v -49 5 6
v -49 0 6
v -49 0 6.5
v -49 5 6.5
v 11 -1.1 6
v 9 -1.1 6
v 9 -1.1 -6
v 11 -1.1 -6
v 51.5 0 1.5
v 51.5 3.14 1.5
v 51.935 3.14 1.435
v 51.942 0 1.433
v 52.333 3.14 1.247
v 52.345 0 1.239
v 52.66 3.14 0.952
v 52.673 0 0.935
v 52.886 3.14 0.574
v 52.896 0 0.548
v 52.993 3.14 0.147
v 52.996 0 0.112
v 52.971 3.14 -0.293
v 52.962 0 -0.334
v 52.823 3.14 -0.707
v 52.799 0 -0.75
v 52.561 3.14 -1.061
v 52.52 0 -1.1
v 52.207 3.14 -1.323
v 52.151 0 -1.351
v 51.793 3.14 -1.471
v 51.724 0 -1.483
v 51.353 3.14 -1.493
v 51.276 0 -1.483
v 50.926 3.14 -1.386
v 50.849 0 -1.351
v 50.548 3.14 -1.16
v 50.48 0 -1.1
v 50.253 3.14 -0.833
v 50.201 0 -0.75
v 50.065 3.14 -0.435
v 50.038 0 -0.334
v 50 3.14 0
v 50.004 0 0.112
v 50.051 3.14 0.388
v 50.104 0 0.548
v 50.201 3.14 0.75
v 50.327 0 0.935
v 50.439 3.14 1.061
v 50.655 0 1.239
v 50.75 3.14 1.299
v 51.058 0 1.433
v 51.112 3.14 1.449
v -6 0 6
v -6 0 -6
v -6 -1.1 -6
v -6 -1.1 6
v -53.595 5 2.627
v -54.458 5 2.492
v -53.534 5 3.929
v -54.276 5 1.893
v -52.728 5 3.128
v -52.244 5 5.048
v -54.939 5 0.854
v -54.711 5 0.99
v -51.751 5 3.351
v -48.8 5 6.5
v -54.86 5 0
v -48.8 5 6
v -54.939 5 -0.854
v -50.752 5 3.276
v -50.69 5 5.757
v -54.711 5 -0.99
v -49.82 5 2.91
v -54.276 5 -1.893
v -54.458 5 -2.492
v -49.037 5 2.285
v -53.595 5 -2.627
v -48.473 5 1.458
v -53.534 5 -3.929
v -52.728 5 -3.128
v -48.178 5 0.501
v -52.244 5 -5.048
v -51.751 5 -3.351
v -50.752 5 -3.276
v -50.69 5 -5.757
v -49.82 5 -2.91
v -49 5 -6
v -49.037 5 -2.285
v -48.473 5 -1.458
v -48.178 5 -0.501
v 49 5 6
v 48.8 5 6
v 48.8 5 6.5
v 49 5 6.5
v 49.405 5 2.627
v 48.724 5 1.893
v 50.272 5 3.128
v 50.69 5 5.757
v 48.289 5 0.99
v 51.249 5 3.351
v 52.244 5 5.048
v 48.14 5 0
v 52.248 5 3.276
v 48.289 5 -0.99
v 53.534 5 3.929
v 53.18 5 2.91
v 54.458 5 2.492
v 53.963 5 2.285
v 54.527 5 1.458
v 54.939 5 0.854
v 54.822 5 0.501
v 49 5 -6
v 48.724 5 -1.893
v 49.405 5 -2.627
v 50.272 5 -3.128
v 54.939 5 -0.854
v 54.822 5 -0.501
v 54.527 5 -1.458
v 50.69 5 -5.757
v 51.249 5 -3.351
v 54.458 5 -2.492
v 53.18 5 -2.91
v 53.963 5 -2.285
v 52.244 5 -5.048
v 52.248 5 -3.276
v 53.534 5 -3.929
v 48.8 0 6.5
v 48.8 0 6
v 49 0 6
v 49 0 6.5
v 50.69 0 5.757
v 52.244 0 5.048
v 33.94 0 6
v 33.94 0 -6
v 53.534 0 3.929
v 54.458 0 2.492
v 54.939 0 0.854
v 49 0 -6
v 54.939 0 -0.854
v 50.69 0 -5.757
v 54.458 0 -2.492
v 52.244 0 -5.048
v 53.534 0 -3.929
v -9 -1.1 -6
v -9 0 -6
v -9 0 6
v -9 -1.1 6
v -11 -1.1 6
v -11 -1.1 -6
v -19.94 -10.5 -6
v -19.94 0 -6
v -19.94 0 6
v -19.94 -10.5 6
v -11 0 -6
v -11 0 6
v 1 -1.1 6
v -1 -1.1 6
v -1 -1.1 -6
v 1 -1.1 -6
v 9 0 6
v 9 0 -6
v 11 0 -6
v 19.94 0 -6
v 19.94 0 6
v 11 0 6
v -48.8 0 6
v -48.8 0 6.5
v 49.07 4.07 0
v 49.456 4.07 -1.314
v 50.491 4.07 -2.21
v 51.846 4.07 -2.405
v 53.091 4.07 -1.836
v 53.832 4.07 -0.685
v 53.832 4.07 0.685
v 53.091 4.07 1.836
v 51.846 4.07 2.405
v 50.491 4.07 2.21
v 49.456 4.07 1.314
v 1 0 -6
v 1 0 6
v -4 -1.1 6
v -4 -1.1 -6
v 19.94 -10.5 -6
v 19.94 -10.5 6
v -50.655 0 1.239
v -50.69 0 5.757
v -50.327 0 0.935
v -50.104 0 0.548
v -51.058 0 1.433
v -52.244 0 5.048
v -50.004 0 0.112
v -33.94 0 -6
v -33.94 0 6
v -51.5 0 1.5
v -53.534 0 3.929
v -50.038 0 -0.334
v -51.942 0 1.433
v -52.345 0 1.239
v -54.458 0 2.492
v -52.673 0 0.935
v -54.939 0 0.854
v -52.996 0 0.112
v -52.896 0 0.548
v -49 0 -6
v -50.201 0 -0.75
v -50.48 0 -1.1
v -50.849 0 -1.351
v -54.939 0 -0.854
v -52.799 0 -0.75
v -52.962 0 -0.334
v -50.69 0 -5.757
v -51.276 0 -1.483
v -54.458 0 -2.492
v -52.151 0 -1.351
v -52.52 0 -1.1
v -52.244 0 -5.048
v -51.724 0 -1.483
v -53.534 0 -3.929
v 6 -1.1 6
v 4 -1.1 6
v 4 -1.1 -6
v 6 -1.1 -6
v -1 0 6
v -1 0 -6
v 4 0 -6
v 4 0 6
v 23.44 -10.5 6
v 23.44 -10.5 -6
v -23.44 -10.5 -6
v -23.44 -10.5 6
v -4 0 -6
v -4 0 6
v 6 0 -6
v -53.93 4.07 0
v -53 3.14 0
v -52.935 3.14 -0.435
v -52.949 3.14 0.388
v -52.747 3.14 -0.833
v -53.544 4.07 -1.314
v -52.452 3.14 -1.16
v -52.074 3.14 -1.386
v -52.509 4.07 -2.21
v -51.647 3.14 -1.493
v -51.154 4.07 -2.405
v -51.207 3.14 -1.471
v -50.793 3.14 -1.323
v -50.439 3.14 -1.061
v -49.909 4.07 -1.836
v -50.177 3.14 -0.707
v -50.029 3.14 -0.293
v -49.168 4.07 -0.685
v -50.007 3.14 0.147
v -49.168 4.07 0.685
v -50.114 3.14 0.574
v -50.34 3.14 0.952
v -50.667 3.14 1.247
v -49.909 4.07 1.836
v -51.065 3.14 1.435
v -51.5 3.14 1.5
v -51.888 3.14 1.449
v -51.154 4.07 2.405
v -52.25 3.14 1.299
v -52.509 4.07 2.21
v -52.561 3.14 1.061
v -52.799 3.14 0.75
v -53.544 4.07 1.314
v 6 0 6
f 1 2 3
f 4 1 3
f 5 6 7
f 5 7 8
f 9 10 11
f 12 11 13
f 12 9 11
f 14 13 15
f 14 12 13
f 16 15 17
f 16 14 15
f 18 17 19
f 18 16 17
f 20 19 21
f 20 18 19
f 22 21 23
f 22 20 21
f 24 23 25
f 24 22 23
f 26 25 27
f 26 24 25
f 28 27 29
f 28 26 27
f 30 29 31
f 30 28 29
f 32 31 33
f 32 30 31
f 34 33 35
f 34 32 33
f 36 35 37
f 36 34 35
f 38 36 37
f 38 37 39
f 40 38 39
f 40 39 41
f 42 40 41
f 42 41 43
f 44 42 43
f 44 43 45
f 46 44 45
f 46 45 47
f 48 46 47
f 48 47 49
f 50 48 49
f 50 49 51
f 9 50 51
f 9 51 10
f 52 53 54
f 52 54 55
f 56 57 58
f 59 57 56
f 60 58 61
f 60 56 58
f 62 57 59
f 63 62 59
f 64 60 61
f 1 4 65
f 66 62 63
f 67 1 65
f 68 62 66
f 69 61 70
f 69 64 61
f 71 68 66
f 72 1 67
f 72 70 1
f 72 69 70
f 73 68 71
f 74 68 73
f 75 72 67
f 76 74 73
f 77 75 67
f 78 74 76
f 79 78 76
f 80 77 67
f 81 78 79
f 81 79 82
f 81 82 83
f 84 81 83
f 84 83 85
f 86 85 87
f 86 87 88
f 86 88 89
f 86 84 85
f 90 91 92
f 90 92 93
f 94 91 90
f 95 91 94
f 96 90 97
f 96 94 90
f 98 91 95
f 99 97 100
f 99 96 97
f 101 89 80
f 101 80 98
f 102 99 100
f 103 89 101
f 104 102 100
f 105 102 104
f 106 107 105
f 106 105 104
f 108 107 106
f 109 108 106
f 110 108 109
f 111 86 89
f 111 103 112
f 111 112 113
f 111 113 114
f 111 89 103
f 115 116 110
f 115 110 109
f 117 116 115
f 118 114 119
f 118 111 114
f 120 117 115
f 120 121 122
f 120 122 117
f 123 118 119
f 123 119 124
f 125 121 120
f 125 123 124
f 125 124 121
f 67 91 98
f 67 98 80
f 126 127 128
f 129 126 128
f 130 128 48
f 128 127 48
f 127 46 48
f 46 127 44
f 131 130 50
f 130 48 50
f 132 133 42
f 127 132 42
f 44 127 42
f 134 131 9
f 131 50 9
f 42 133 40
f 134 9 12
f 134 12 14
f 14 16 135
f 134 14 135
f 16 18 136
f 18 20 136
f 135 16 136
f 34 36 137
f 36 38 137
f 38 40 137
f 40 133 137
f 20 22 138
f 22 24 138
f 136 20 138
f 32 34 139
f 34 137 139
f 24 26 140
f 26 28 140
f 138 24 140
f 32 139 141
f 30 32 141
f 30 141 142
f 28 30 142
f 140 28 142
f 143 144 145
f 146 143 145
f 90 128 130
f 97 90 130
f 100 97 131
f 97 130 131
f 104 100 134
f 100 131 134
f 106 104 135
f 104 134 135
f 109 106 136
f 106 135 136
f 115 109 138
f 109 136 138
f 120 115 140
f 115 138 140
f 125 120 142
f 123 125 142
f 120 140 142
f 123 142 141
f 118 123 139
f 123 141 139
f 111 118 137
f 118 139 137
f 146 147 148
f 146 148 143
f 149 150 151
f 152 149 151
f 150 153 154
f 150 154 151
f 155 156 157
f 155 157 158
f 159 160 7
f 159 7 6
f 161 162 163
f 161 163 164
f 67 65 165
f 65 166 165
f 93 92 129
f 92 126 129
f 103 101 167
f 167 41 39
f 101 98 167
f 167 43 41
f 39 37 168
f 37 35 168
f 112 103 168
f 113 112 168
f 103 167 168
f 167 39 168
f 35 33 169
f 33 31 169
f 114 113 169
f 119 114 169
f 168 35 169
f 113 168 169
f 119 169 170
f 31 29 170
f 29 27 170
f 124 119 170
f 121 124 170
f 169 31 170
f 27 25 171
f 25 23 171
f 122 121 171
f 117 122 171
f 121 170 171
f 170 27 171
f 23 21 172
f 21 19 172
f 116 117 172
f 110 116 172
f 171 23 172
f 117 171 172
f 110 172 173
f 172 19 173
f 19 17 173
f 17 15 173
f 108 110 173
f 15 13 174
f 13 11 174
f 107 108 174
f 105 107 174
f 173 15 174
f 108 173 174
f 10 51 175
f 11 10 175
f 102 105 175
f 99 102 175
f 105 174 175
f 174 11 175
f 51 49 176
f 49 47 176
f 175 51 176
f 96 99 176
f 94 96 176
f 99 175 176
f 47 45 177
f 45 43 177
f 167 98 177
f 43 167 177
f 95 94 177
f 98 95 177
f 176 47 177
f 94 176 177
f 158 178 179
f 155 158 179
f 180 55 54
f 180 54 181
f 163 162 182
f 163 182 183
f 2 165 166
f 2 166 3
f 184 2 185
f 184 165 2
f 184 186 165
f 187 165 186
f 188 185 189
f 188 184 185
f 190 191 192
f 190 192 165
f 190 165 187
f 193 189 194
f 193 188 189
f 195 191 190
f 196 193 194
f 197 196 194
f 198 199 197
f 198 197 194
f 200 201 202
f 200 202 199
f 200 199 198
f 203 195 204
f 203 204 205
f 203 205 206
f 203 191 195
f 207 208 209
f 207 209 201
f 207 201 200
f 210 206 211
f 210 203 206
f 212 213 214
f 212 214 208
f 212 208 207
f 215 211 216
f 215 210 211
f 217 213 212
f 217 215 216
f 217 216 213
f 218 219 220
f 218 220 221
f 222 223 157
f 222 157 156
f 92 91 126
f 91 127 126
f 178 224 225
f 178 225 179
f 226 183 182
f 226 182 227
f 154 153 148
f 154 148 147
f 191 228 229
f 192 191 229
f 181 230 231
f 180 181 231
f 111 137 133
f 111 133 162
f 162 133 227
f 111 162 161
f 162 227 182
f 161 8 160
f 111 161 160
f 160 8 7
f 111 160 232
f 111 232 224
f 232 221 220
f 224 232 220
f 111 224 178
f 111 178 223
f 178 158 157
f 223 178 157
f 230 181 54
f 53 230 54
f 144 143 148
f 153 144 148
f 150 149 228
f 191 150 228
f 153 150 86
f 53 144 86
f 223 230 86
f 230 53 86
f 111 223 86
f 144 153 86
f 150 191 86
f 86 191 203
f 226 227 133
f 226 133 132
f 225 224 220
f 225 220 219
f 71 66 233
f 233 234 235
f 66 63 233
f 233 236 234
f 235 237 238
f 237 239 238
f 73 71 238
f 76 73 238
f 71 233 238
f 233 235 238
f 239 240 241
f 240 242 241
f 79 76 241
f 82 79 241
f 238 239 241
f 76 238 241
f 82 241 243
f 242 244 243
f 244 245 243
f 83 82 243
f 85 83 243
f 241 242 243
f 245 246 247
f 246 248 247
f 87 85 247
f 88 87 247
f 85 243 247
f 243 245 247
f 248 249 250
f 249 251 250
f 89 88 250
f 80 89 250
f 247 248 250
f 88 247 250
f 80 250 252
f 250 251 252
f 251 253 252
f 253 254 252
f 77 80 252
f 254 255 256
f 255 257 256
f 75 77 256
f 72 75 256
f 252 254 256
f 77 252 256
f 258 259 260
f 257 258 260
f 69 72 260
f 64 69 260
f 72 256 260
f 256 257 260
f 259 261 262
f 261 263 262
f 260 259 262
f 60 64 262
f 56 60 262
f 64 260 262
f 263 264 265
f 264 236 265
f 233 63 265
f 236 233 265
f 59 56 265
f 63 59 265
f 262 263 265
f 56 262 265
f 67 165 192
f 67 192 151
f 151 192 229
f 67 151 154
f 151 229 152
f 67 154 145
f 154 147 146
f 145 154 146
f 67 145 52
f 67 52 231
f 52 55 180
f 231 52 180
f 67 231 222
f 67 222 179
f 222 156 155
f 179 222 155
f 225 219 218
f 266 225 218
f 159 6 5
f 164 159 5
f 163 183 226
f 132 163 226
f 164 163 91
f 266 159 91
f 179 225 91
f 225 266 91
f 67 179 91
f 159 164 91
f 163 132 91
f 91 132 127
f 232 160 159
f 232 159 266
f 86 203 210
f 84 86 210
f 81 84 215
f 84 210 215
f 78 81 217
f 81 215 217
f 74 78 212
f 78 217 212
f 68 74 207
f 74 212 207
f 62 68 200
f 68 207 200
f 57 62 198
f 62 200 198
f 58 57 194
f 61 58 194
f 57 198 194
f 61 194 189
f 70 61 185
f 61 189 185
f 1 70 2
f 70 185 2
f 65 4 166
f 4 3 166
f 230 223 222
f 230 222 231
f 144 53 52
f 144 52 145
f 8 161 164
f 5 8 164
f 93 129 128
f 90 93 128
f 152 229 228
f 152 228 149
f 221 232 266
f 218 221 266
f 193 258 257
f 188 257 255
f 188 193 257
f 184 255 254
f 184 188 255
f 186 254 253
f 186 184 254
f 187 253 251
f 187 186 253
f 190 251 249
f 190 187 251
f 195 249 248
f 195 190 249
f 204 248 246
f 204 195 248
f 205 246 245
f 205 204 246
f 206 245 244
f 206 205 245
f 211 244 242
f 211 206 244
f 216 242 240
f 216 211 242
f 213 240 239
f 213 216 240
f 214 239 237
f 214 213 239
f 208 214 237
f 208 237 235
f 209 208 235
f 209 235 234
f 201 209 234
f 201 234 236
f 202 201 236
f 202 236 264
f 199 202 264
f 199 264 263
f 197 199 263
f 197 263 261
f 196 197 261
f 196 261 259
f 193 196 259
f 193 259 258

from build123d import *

# Parameters (mm, degrees)
SKETCH1_R                     = 1.5
BOSS_EXTRUDE1_DEPTH           = 3
SKETCH4_W                     = 3.5
SKETCH4_H                     = 12
BOSS_EXTRUDE3_DEPTH           = 10.5
SKETCH5_W                     = 2
SKETCH5_H                     = 12
BOSS_EXTRUDE4_DEPTH           = 1.1
SKETCH6_W                     = 0.2
SKETCH6_H                     = 3
BOSS_EXTRUDE5_DEPTH           = 0.5
CHAMFER1_SIZE                 = 10.5
F_3_0MM_DOWEL_HOLE1_D         = 3
F_3_0MM_DOWEL_HOLE1_DEPTH     = 13.5
SKETCH10_R                    = 1.5
BOSS_EXTRUDE6_DEPTH           = 2
CSK_FOR_M3_SFHCS1_D           = 3
CSK_FOR_M3_SFHCS1_DEPTH       = 31.098709071
CSK_FOR_M3_SFHCS1_CSINK_D     = 6.72
CSK_FOR_M3_SFHCS1_CSINK_ANGLE = 90
CSK_FOR_M3_SFHCS1_TIP         = 0.901290929


with BuildPart() as part:
    # Sketch1 → Boss-Extrude1 (new body)
    with BuildSketch(Plane(origin=(0, 0, 0), x_dir=(1, 0, 0), z_dir=(0, 1, 0))):
        with BuildLine():
            Line((-49, 6), (49, 6))
            ThreePointArc((49, 6), (55, 0), (49, -6))
            Line((49, -6), (-49, -6))
            ThreePointArc((-49, -6), (-55, 0), (-49, 6))
        make_face()
        with Locations(Location((-51.5, 0, 0), (0, 0, 270))):
            Circle(SKETCH1_R, mode=Mode.SUBTRACT)
        with Locations(Location((51.5, 0, 0), (0, 0, 270))):
            Circle(SKETCH1_R, mode=Mode.SUBTRACT)
    extrude(amount=BOSS_EXTRUDE1_DEPTH)

    # Sketch4 → Boss-Extrude3 (add)
    with BuildSketch(Plane.XZ):
        with Locations((-21.690023983, 0)):
            Rectangle(SKETCH4_W, SKETCH4_H)
        with Locations((21.690023983, 0)):
            Rectangle(SKETCH4_W, SKETCH4_H)
    extrude(amount=BOSS_EXTRUDE3_DEPTH)

    # Sketch5 → Boss-Extrude4 (add)
    with BuildSketch(Plane.XZ):
        with Locations((5, 0)):
            Rectangle(SKETCH5_W, SKETCH5_H)
        Rectangle(SKETCH5_W, SKETCH5_H)
        with Locations((10, 0)):
            Rectangle(SKETCH5_W, SKETCH5_H)
        with Locations((-5, 0)):
            Rectangle(SKETCH5_W, SKETCH5_H)
        with Locations((-10, 0)):
            Rectangle(SKETCH5_W, SKETCH5_H)
    extrude(amount=BOSS_EXTRUDE4_DEPTH)

    # Sketch6 → Boss-Extrude5 (add)
    with BuildSketch(Plane.XY.offset(6)):
        with Locations((48.9, 1.5)):
            Rectangle(SKETCH6_W, SKETCH6_H)
        with Locations((-48.9, 1.5)):
            Rectangle(SKETCH6_W, SKETCH6_H)
    extrude(amount=BOSS_EXTRUDE5_DEPTH)

    # Chamfer1
    chamfer1_edges = [part.edges().sort_by_distance(p)[0] for p in [
        (23.440023983, 0, 0),
        (-23.440023983, 0, 0),
    ]]
    chamfer(chamfer1_edges, length=CHAMFER1_SIZE - 0.0001)  # a hair under: the kernel refuses the full size

    # Ø3.0mm Dowel Hole1
    with Locations(Plane(origin=(0, 3, 0), x_dir=(1, 0, 0), z_dir=(0, 1, 0))):
        with Locations((-51.5, 0), (51.5, 0)):
            Hole(F_3_0MM_DOWEL_HOLE1_D / 2, depth=F_3_0MM_DOWEL_HOLE1_DEPTH)

    # Sketch10 → Boss-Extrude6 (add)
    with BuildSketch(Plane(origin=(0, 3, 0), x_dir=(1, 0, 0), z_dir=(0, 1, 0))):
        with BuildLine():
            Line((-49, -6), (-49, -6.5))
            Line((-49, -6.5), (-48.8, -6.5))
            Line((-48.8, -6.5), (-48.8, -6))
            Line((-48.8, -6), (48.8, -6))
            Line((48.8, -6), (48.8, -6.5))
            Line((48.8, -6.5), (49, -6.5))
            Line((49, -6.5), (49, -6))
            ThreePointArc((49, -6), (55, 0), (49, 6))
            Line((49, 6), (-49, 6))
            ThreePointArc((-49, 6), (-55, 0), (-49, -6))
        make_face()
        with Locations(Location((-51.5, 0, 0), (0, 0, 270))):
            Circle(SKETCH10_R, mode=Mode.SUBTRACT)
        with Locations(Location((51.5, 0, 0), (0, 0, 270))):
            Circle(SKETCH10_R, mode=Mode.SUBTRACT)
    extrude(amount=BOSS_EXTRUDE6_DEPTH)

    # CSK for M3 SFHCS1
    with Locations(Plane(origin=(0, 5, 0), x_dir=(1, 0, 0), z_dir=(0, 1, 0))):
        with Locations((51.5, 0), (-51.5, 0)):
            CounterSinkHole(CSK_FOR_M3_SFHCS1_D / 2, CSK_FOR_M3_SFHCS1_CSINK_D / 2, depth=CSK_FOR_M3_SFHCS1_DEPTH, counter_sink_angle=CSK_FOR_M3_SFHCS1_CSINK_ANGLE)
            with Locations((0, 0, -(CSK_FOR_M3_SFHCS1_DEPTH + CSK_FOR_M3_SFHCS1_TIP / 2))):  # 118° drill point
                Cone(0, CSK_FOR_M3_SFHCS1_D / 2, CSK_FOR_M3_SFHCS1_TIP, mode=Mode.SUBTRACT)


solid = part.part
